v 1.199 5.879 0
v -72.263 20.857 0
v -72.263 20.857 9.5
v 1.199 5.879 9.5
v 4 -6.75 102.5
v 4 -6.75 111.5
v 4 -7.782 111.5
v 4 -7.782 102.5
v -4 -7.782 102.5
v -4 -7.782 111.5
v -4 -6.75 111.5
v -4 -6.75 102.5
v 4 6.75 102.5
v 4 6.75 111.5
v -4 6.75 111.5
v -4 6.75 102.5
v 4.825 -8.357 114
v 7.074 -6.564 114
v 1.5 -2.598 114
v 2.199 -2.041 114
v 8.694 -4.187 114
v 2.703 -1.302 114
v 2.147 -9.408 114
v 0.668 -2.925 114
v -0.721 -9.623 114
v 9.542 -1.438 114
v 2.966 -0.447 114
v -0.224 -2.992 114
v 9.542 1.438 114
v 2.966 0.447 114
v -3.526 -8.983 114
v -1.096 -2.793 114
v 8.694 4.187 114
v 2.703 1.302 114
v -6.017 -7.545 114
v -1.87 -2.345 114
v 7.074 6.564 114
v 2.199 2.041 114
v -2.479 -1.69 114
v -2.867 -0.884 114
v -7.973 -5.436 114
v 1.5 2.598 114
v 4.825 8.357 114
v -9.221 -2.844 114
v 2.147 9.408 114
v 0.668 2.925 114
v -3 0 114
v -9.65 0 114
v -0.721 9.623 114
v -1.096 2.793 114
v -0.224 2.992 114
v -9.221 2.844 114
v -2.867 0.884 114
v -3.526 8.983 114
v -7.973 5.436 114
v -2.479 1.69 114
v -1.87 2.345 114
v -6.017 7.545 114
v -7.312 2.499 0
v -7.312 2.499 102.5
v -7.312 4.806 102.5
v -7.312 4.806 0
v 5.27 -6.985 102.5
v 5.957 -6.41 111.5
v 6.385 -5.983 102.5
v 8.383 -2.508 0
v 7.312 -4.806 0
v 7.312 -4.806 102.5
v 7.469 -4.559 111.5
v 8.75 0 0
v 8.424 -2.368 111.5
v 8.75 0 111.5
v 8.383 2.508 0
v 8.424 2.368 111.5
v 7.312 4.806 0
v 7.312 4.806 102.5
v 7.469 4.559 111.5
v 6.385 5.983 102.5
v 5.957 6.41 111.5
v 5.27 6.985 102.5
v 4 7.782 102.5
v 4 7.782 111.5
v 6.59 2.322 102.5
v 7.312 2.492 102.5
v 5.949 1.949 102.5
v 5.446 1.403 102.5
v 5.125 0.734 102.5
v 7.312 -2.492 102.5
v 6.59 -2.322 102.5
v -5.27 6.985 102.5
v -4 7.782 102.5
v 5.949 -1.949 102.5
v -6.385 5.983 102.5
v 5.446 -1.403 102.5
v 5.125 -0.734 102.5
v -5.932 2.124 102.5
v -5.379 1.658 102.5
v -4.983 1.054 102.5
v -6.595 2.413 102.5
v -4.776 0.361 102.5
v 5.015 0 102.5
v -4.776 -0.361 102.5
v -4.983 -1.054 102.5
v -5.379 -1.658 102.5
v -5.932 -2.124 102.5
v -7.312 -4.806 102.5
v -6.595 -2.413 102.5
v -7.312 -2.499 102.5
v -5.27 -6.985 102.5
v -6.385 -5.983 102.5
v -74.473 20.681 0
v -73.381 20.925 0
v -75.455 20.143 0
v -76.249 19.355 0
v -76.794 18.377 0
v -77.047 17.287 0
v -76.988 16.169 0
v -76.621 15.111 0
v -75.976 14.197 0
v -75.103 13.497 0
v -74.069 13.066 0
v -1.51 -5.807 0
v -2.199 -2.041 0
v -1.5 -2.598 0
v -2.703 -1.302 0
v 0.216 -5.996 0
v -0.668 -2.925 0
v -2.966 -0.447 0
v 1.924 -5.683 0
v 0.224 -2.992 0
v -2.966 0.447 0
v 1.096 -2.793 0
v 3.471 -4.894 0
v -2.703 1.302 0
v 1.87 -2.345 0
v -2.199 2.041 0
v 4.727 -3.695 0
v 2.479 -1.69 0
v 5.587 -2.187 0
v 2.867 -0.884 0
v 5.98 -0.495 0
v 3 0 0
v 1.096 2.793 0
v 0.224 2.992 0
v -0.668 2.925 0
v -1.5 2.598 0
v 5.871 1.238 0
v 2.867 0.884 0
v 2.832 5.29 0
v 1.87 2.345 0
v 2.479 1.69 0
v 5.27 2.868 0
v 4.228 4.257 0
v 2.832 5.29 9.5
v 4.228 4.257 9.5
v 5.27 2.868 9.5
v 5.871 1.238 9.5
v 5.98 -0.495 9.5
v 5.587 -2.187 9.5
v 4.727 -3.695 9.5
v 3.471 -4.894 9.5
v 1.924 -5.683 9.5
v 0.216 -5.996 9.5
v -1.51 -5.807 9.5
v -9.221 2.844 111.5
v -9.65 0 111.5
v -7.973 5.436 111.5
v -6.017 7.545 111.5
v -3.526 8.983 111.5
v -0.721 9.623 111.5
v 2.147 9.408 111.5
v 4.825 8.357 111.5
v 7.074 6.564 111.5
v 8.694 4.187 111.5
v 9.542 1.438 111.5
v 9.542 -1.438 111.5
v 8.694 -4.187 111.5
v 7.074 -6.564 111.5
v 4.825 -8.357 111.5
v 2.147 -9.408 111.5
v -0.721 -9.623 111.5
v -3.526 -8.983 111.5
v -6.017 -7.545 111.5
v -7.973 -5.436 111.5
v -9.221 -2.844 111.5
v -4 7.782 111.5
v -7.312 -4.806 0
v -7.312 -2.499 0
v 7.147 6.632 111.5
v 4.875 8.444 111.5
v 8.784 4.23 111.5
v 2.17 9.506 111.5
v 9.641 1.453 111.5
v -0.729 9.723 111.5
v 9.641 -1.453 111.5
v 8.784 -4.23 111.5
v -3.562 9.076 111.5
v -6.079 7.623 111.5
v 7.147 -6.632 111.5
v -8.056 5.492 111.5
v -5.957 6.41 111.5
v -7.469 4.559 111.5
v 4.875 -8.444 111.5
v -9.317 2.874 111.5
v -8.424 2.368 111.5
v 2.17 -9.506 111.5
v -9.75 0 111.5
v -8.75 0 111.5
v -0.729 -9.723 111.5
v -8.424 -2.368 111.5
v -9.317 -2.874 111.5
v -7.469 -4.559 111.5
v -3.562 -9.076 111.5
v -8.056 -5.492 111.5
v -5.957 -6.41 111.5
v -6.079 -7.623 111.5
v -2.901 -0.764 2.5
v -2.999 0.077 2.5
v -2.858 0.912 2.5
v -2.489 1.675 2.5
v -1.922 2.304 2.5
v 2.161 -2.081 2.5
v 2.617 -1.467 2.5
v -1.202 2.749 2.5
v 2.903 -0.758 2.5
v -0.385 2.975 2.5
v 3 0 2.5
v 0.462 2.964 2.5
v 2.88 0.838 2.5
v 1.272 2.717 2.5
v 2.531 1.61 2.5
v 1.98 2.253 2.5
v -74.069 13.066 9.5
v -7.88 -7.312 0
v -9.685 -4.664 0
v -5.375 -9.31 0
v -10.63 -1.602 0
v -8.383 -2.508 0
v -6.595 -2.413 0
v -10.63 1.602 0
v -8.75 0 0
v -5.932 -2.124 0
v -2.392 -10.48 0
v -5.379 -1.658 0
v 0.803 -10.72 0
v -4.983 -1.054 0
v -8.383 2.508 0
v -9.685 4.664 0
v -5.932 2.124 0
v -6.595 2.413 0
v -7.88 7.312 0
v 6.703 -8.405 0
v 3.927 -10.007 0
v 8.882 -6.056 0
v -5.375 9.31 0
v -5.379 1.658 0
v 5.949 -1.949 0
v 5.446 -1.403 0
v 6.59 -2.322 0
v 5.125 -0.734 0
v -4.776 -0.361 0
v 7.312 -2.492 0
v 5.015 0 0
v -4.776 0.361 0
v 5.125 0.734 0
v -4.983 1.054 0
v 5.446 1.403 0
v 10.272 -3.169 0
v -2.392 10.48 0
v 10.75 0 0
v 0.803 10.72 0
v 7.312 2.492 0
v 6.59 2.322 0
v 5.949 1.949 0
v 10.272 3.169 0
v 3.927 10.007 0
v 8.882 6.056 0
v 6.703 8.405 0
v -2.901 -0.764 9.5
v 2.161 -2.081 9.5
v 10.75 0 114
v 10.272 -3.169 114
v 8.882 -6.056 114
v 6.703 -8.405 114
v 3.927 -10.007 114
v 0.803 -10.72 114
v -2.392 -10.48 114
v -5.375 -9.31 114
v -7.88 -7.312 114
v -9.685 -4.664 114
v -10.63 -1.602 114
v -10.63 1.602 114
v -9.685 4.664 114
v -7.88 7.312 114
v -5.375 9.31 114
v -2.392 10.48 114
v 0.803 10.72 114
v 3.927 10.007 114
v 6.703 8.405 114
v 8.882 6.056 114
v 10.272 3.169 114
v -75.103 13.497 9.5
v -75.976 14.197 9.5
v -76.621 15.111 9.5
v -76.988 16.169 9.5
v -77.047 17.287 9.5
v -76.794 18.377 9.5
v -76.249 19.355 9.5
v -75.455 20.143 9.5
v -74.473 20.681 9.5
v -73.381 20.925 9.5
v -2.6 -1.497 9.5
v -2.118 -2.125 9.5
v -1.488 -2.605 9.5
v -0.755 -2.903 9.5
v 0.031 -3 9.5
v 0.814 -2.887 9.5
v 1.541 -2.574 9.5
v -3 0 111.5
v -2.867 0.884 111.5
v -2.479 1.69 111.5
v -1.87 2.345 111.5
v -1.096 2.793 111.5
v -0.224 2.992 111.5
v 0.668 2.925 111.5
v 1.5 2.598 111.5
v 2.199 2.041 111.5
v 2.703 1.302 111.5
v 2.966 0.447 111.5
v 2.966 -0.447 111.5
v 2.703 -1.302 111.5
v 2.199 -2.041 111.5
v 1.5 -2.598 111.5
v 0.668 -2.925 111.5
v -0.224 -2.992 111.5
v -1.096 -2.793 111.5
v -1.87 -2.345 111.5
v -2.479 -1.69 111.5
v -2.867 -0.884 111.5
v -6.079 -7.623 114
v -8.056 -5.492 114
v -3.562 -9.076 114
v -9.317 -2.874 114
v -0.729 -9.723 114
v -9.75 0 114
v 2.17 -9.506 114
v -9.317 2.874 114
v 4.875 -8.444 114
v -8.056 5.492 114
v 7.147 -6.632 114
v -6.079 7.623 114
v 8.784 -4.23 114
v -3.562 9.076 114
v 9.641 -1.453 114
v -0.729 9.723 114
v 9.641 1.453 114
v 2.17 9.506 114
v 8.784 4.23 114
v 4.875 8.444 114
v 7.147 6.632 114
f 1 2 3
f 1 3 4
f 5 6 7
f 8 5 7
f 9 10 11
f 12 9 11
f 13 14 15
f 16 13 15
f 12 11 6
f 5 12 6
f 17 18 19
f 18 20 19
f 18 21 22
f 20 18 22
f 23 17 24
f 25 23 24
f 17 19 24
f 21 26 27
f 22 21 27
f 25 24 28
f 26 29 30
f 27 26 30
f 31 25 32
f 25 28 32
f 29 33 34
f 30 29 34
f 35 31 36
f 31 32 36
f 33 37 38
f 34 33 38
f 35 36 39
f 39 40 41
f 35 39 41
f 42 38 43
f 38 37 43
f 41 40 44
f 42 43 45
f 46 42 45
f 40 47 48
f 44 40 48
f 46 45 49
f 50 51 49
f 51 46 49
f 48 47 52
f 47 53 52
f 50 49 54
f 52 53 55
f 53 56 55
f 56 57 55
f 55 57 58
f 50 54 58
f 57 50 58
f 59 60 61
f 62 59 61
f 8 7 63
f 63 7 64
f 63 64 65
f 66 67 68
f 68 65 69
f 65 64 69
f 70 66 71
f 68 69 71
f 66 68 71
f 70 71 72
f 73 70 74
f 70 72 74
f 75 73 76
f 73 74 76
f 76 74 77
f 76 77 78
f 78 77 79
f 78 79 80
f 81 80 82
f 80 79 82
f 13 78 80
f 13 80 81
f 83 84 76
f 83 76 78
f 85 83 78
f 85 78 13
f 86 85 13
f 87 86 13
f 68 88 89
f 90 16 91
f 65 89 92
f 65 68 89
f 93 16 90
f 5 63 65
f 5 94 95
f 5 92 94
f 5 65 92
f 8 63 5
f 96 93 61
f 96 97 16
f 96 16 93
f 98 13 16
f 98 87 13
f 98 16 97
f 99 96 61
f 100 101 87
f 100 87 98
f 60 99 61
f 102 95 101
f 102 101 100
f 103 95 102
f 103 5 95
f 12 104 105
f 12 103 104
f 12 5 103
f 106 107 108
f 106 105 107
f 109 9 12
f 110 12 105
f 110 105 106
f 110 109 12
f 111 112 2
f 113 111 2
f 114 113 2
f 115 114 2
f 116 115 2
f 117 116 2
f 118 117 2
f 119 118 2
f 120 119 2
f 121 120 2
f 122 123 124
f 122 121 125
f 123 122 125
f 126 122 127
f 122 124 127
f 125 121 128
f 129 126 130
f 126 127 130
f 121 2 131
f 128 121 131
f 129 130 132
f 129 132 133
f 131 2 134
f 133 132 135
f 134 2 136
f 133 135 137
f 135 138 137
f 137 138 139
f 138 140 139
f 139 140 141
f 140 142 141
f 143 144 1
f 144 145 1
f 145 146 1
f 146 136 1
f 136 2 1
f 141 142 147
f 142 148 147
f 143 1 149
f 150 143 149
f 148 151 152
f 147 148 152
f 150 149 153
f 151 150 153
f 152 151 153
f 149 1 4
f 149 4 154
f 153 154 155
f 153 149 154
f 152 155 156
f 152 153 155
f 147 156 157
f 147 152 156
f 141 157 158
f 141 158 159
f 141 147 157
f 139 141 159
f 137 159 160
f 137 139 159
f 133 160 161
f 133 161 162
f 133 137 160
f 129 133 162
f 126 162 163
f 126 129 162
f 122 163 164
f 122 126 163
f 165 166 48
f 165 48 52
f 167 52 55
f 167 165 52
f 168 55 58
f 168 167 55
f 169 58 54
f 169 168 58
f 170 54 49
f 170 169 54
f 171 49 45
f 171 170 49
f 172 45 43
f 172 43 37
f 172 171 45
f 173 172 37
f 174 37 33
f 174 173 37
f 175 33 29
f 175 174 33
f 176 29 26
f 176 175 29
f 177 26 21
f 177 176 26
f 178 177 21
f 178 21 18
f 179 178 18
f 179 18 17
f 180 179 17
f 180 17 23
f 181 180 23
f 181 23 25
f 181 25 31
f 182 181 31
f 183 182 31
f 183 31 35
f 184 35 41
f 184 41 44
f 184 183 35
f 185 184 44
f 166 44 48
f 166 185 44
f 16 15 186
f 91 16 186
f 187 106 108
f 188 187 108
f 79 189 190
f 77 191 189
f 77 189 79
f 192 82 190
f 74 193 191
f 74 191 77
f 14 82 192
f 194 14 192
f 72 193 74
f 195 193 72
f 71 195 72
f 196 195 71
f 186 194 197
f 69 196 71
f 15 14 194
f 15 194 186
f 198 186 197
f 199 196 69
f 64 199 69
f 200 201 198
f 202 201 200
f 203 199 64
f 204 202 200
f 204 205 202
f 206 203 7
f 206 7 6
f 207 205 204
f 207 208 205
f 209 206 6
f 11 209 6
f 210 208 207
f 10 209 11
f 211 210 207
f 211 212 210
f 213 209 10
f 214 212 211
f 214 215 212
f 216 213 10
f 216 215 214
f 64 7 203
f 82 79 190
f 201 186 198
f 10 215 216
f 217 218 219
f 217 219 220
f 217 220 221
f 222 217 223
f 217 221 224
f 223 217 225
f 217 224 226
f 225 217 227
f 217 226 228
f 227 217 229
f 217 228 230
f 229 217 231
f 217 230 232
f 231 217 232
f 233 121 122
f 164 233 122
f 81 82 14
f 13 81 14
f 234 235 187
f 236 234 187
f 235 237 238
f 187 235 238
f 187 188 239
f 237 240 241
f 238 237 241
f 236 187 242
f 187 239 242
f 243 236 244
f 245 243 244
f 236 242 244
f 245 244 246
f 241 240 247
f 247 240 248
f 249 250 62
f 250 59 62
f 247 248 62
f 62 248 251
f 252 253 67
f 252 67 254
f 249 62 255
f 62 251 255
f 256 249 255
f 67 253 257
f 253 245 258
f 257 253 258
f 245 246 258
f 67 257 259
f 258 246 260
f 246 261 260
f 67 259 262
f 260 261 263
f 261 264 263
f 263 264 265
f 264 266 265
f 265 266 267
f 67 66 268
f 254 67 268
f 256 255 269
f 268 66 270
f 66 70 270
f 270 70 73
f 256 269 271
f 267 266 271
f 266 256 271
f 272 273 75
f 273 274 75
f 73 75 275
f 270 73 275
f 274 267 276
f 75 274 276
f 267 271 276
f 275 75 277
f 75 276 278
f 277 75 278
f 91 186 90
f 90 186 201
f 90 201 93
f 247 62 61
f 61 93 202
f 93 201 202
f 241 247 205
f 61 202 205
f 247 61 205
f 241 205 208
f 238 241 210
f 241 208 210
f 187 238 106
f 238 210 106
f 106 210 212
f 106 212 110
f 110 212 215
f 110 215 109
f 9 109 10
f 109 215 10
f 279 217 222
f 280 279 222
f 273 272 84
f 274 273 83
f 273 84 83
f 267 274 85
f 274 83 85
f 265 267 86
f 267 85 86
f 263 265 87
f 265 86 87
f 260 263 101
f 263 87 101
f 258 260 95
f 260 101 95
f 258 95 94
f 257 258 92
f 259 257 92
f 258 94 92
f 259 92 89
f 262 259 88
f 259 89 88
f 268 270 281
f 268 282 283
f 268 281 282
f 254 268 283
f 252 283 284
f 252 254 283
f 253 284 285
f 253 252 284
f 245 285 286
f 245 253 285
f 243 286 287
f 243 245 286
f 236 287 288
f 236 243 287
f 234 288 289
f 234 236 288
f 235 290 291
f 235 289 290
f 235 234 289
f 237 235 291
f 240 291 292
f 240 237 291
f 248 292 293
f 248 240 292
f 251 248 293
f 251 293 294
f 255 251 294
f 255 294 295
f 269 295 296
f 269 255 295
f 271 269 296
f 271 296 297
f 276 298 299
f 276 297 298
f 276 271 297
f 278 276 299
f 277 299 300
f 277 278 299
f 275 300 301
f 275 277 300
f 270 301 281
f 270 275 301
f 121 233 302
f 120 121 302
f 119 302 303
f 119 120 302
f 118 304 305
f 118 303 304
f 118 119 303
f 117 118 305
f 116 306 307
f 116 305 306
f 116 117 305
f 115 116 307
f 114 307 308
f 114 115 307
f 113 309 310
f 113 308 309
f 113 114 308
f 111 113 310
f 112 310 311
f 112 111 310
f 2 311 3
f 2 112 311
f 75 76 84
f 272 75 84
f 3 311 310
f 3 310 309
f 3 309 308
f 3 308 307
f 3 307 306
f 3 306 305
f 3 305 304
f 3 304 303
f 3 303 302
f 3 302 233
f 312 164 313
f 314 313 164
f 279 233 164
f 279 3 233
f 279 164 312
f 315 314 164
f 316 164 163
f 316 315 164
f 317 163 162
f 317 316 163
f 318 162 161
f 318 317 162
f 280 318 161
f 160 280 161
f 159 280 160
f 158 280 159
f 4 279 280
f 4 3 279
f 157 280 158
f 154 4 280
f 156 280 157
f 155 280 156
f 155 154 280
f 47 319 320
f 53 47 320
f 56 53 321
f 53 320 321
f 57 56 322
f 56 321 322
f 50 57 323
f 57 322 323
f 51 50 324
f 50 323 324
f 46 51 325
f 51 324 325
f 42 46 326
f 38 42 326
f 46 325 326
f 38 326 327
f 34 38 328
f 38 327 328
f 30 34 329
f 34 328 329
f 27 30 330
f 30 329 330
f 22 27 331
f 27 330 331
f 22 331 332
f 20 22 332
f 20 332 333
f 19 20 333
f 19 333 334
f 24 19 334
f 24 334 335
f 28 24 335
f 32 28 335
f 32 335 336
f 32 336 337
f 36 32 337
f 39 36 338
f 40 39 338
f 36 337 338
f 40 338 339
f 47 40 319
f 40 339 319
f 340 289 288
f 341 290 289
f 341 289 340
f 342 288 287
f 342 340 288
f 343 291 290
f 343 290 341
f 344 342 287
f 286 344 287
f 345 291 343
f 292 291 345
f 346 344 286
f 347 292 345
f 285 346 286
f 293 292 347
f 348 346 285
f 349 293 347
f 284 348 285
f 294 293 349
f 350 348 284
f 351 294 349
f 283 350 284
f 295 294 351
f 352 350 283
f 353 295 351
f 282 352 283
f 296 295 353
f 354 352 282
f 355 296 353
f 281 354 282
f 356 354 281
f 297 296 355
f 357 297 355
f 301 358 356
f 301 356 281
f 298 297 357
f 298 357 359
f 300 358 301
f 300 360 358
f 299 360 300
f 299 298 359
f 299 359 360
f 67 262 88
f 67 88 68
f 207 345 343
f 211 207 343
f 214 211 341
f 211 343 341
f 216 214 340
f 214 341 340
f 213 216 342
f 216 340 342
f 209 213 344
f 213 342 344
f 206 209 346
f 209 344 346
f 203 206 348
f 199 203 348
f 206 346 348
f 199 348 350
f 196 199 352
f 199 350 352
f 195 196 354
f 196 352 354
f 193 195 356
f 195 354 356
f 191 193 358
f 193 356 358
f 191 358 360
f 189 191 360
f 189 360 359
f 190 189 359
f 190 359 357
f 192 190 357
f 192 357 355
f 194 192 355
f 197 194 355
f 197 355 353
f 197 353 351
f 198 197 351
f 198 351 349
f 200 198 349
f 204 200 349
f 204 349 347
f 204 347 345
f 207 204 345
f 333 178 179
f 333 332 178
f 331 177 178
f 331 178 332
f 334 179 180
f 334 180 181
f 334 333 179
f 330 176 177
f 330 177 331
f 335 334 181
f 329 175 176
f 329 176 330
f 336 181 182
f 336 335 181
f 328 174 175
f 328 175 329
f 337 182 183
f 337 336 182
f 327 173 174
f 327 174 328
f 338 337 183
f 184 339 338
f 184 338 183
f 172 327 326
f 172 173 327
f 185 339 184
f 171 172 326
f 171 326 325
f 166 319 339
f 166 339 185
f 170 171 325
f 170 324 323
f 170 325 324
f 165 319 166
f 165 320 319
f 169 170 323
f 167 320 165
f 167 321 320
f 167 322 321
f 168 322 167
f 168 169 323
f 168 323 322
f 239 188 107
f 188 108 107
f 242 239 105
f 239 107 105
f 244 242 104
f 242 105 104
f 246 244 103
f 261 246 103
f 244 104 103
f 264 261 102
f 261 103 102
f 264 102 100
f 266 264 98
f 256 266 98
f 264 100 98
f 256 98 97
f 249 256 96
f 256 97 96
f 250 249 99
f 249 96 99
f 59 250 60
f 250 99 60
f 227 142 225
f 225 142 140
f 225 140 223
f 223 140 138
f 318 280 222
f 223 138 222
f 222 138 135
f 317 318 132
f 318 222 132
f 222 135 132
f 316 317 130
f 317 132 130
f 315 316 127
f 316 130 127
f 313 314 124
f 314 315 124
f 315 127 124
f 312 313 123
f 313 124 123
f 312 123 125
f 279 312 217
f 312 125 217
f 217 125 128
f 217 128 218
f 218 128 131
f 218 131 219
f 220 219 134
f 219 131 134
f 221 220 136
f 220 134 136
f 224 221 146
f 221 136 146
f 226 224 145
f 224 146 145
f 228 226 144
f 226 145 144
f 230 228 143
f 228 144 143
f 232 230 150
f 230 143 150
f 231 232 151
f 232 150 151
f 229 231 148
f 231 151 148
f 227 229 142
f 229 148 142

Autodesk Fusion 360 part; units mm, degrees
sketch "Sketch1" plane through (0, 0, 0) normal (0, 0, 1) x (1, 0, 0)
  circle A0 centre (0, 0) radius 10.75
  dimension "d1" = 21.5
extrude "Extrude1" add sketch "Sketch1" along normal blind 114 makes body 1
sketch "Sketch2" plane through (0, 0, 114) normal (0, 0, 1) x (-1, 0, 0)
  circle A0 centre (0, 0) radius 10.75
  circle A1 centre (0, 0) radius 9.75
  dimension "d6" = 19.5
extrude "Extrude2" cut sketch "Sketch2" against normal blind 2.5 contours A1 bodies 1
copy_body "CutPasteBodies1" bodies 1 removing the originals makes body 2 in component "Main Housing"
sketch "Sketch1 (2)" plane through (0, 0, 111.5) normal (0, 0, 1) x (-1, 0, 0) in component "Main Housing"
  circle A0 centre (0, 0) radius 9.75
  line L0 (-7.3121, -6.4494) -> (-7.3121, 6.4494)
  line L1 (7.3121, 6.4494) -> (7.3121, -6.4494)
  line L2 (7, -10.4909) -> (-7, 10.4909) construction
  line L3 (-7, -10.4909) -> (7, 10.4909) construction
  circle A1 centre (0, 0) radius 8.75
  circle A2 centre (7.25, 0) radius 2.5
  line L4 (7.3121, 0) -> (7.25, 0) construction
  line L5 (-0.1325, 8.749) -> (-0.1325, -8.749) construction
  circle A3 centre (-7.5149, 0) radius 2.5
  dimension "d9" = 14
  dimension "d14" = 5
  dimension "d15" = 17.5
extrude "Extrude1'" cut sketch "Sketch1 (2)" against normal up to surface (111.5 mm away) contours L1 A1 A2 | L1 A1 A2 | L1 A1 A2 | L1 A2 | L0 A1 A3 | L0 A1 A3 | L0 A1 A3 | L0 A3 bodies 2 in component "Main Housing"
extrude "Extrude4" cut sketch "Sketch1 (2)" against normal blind 9 contours L0 L1 A1 A2 A3 bodies 2 in component "Main Housing"
sketch "Sketch2 (2)" plane through (0, 0, 111.5) normal (0, 0, 1) x (-1, 0, 0) in component "Main Housing"
  line L0 (-4, -7.7822) -> (-4, 7.7822)
  line L1 (4, 7.7822) -> (4, -7.7822)
  line L2 (4, -12.291) -> (-4, 12.291) construction
  line L3 (-4, -12.291) -> (4, 12.291) construction
  circle A0 centre (0, 0) radius 8.75
  circle A1 centre (0, 0) radius 8.75
  line L4 (-4, -6.75) -> (4, -6.75)
  line L5 (4, -6.75) -> (4, 6.75)
  line L6 (4, 6.75) -> (-4, 6.75)
  line L7 (-4, 6.75) -> (-4, -6.75)
  line L8 (-4, -6.75) -> (4, 6.75) construction
  line L9 (4, -6.75) -> (-4, 6.75) construction
  dimension "d21" = 8
  dimension "d22" = 13.5
extrude "Extrude5" add sketch "Sketch2 (2)" against normal up to surface (9 mm away) contours L0 L1 A0 A1 L4 | L0 L1 A0 A1 L6 bodies 2 in component "Main Housing"
sketch "Sketch1 (3)" plane through (0, 0, 114) normal (0, 0, 1) x (-1, 0, 0) in component "Cap"
  circle A0 centre (0, 0) radius 9.75
  circle A1 centre (0, 0) radius 10.75
  circle A2 centre (0, 0) radius 9.65
  circle A3 centre (0, 0) radius 3
  dimension "d25" = 19.3
  dimension "d28" = 6
extrude "Extrude1''" add sketch "Sketch1 (3)" against normal up to surface (2.5 mm away) separate body contours A2 makes body 3 in component "Cap"
sketch "Sketch1 (4)" plane through (0, 0, 0) normal (0, 0, 1) x (1, 0, 0) in component "Handle"
  circle A0 centre (0, 0) radius 6
  circle A1 centre (-73.0625, 16.9375) radius 4
  line L0 (-72.2634, 20.8568) -> (1.1986, 5.8791)
  line L1 (-74.0694, 13.0663) -> (-1.5104, -5.8068)
  circle A2 centre (0, 0) radius 3
  line L2 (-2.901, -0.7643) -> (2.1609, -2.081)
  line L3 (-0.37, -1.4227) -> (0.7552, 2.9034) construction
  dimension "d41" = 12
  dimension "d42" = 8
  dimension "d43" = 75
  dimension "d44" = 6
  dimension "d48" = 4.47
extrude "Extrude1'''" add sketch "Sketch1 (4)" along normal blind 2.5 separate body makes body 4 in component "Handle"
extrude "Extrude2'" add sketch "Sketch1 (4)" along normal blind 7 from surface at 2.5 contours A0 | A0 A1 L0 L1 | A1 | A2 L2 picked at (0.5427, 0.1152) bodies 4 in component "Handle"
component "Main Housing" placed x (1, 0, 0) y (0, 1, 0) z (0, 0, 1) at (0, 0, 0)
component "Cap" placed x (1, 0, 0) y (0, -1, 0) z (0, 0, -1) at (0, 0, 225.5)
component "Handle" placed x (1, 0, 0) y (0, 1, 0) z (0, 0, 1) at (0, 0, 0)
equation "d1 = diameter"
equation "d2 = length"
equation "diameter = 21.5 mm"
equation "length = 114 mm"
equation "d6 = diameter - 2 mm"
equation "d15 = diameter - 4 mm"
equation "d25 = diameter - 2.2 mm"
